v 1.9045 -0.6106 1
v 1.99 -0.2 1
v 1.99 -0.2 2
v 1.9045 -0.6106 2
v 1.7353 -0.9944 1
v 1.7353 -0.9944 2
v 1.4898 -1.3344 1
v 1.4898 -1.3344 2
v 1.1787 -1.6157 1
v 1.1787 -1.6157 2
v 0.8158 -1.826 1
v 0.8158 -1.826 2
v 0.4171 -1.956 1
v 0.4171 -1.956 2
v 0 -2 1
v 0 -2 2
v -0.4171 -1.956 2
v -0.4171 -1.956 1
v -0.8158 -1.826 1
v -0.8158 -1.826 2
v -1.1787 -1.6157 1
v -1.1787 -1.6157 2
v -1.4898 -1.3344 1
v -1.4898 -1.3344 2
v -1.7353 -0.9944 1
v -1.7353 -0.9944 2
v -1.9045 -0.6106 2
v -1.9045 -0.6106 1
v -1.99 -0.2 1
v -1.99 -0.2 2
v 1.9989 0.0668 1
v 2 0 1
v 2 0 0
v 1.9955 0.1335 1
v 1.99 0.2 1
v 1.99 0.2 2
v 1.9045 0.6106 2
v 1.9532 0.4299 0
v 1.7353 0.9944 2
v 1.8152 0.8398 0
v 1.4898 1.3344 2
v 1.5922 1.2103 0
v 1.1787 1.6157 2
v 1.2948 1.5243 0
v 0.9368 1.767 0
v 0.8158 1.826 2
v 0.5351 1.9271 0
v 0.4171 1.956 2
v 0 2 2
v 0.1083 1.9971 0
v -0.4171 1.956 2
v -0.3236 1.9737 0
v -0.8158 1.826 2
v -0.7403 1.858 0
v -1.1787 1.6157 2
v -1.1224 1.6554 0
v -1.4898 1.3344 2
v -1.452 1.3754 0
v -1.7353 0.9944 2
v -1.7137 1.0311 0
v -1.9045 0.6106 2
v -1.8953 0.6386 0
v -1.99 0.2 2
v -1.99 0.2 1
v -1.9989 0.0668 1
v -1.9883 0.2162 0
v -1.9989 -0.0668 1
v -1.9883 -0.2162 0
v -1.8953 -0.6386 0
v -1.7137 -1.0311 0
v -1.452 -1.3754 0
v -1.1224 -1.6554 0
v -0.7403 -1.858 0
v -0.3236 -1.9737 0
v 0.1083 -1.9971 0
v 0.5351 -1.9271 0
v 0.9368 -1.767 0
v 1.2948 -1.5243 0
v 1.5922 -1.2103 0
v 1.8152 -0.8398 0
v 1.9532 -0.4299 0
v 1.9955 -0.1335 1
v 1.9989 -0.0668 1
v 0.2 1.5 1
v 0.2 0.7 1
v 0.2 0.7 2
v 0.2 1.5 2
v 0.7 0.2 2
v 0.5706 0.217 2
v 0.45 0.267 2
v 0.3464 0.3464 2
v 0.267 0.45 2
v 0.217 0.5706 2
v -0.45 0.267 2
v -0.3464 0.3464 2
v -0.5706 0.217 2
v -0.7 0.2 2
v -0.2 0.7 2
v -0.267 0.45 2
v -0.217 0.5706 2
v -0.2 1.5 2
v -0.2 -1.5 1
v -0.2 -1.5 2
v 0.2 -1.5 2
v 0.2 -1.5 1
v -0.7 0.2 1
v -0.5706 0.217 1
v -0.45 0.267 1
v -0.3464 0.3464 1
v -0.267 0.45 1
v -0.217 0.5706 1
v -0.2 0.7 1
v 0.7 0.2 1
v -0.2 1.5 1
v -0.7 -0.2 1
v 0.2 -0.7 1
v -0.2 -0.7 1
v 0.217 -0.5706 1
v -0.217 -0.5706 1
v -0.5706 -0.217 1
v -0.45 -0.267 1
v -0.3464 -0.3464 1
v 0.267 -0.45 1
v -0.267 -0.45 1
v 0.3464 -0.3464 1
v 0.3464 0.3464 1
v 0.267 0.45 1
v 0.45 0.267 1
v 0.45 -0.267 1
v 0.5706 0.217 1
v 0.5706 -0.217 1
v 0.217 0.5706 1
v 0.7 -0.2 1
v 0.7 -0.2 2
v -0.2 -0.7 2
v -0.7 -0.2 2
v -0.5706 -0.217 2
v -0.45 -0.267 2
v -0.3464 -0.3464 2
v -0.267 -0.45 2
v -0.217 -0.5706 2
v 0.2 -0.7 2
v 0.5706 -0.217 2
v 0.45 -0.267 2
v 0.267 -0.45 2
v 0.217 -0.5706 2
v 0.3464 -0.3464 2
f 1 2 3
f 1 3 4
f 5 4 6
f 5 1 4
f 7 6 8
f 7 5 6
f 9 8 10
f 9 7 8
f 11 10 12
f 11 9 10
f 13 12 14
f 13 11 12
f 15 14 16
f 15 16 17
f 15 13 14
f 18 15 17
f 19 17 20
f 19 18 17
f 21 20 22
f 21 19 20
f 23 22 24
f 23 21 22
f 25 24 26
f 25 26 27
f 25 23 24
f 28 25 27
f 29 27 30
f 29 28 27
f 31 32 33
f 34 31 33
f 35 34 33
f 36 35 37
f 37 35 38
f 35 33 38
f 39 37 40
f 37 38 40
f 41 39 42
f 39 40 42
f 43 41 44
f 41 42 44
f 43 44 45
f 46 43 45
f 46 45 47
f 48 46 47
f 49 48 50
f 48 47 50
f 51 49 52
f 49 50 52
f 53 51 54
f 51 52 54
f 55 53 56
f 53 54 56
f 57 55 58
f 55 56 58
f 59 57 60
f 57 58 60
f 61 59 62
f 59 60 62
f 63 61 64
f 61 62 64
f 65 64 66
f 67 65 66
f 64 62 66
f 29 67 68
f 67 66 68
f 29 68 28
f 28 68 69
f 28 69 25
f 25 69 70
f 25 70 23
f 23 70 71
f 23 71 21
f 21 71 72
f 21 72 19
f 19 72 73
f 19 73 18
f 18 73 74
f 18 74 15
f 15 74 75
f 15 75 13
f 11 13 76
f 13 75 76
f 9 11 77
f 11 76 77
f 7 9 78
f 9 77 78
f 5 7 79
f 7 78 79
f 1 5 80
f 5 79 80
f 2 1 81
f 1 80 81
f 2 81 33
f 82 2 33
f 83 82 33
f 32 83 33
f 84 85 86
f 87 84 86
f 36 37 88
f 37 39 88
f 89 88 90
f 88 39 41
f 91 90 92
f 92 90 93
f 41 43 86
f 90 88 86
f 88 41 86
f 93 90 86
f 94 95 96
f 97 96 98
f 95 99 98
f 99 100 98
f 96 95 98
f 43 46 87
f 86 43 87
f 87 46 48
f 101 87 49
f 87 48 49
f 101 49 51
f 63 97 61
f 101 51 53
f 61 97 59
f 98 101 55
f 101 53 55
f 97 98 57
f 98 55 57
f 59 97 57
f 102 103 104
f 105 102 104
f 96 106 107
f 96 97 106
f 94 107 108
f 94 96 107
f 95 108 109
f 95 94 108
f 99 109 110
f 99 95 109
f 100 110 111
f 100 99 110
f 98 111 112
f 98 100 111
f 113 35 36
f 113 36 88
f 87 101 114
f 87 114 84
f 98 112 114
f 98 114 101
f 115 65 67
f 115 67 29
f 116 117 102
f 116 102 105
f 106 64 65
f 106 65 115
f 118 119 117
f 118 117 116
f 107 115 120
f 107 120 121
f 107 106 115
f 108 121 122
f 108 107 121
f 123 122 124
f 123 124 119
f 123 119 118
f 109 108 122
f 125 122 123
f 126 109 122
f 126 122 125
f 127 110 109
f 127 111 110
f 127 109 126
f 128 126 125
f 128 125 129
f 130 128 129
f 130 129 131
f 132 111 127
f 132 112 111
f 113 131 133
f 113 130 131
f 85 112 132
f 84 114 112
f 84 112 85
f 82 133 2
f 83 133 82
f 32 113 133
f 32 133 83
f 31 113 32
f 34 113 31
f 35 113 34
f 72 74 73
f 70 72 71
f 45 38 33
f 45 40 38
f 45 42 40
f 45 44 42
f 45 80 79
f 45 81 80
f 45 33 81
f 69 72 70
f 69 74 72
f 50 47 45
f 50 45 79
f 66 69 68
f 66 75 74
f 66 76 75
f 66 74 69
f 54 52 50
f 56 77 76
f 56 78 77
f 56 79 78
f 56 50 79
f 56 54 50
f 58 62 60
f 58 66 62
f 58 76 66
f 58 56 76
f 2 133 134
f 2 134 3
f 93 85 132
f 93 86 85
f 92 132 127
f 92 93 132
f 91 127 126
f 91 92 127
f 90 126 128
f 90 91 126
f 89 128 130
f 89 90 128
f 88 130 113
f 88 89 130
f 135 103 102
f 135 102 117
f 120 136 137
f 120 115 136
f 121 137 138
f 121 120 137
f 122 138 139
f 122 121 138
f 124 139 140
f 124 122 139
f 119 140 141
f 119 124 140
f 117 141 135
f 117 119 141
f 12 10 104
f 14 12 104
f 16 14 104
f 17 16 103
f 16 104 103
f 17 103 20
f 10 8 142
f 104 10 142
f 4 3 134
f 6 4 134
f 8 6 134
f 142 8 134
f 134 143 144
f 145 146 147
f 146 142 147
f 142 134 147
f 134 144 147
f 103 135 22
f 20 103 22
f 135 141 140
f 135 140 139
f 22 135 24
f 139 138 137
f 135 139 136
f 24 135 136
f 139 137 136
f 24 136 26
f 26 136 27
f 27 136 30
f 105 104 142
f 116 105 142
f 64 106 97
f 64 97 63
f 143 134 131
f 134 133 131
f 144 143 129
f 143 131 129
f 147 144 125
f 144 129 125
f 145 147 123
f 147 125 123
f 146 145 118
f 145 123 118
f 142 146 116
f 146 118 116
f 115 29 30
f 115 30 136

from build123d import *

# Parameters (mm, degrees)
SKETCH_1_W          = 2
SKETCH_1_H          = 2
CUT_EXTRUDE_START   = -1
CUT_EXTRUDE_1_DEPTH = 1
SKETCH_3_W          = 0.4
SKETCH_3_H          = 1
CUT_EXTRUDE_2_DEPTH = 1.3
EXTRUDE_1_DEPTH     = 1
SKETCH_5_W          = 0.4
SKETCH_5_H          = 1.3
CUT_EXTRUDE_3_DEPTH = 1
FILLET_1_R          = 0.5


with BuildPart() as part:
    # Эскиз1 → Повернуть1 (revolve)
    with BuildSketch(Plane(origin=(0, 0, 0), x_dir=(1, 0, 0), z_dir=(0, 1, 0))):
        with Locations((1, -1)):
            Rectangle(SKETCH_1_W, SKETCH_1_H)
    revolve(axis=Axis((0, 0, 0), (0, 0, 1)))

    # Эскиз2 → Вырез-Вытянуть1 (cut)
    with BuildSketch(Plane.XY.offset(2).offset(CUT_EXTRUDE_START)):
        with BuildLine():
            Line((1.989974874, 0.2), (-1.989974874, 0.2))
            ThreePointArc((-1.989974874, 0.2), (0, -2), (1.989974874, 0.2))
        make_face()
    extrude(amount=CUT_EXTRUDE_1_DEPTH, mode=Mode.SUBTRACT)

    # Эскиз3 → Вырез-Вытянуть2 (cut)
    with BuildSketch(Plane.XZ.offset(-0.2)):
        with Locations((0, 1.5)):
            Rectangle(SKETCH_3_W, SKETCH_3_H)
    extrude(amount=-CUT_EXTRUDE_2_DEPTH, mode=Mode.SUBTRACT)

    # Эскиз4 → Бобышка-Вытянуть1 (add)
    with BuildSketch(Plane.XY.offset(1)):
        with BuildLine():
            Line((-1.989974874, -0.2), (1.989974874, -0.2))
            ThreePointArc((1.989974874, -0.2), (0, -2), (-1.989974874, -0.2))
        make_face()
    extrude(amount=EXTRUDE_1_DEPTH)

    # Эскиз5 → Вырез-Вытянуть3 (cut)
    with BuildSketch(Plane.XY.offset(2)):
        with Locations((0, -0.85)):
            Rectangle(SKETCH_5_W, SKETCH_5_H)
    extrude(amount=-CUT_EXTRUDE_3_DEPTH, mode=Mode.SUBTRACT)

    # Скругление1
    fillet_1_edges = [part.edges().sort_by_distance(p)[0] for p in [
        (-0.2, 0.2, 1.5),
        (0.2, 0.2, 1.5),
        (-0.2, -0.2, 1.5),
        (0.2, -0.2, 1.5),
    ]]
    fillet(fillet_1_edges, radius=FILLET_1_R)


solid = part.part
